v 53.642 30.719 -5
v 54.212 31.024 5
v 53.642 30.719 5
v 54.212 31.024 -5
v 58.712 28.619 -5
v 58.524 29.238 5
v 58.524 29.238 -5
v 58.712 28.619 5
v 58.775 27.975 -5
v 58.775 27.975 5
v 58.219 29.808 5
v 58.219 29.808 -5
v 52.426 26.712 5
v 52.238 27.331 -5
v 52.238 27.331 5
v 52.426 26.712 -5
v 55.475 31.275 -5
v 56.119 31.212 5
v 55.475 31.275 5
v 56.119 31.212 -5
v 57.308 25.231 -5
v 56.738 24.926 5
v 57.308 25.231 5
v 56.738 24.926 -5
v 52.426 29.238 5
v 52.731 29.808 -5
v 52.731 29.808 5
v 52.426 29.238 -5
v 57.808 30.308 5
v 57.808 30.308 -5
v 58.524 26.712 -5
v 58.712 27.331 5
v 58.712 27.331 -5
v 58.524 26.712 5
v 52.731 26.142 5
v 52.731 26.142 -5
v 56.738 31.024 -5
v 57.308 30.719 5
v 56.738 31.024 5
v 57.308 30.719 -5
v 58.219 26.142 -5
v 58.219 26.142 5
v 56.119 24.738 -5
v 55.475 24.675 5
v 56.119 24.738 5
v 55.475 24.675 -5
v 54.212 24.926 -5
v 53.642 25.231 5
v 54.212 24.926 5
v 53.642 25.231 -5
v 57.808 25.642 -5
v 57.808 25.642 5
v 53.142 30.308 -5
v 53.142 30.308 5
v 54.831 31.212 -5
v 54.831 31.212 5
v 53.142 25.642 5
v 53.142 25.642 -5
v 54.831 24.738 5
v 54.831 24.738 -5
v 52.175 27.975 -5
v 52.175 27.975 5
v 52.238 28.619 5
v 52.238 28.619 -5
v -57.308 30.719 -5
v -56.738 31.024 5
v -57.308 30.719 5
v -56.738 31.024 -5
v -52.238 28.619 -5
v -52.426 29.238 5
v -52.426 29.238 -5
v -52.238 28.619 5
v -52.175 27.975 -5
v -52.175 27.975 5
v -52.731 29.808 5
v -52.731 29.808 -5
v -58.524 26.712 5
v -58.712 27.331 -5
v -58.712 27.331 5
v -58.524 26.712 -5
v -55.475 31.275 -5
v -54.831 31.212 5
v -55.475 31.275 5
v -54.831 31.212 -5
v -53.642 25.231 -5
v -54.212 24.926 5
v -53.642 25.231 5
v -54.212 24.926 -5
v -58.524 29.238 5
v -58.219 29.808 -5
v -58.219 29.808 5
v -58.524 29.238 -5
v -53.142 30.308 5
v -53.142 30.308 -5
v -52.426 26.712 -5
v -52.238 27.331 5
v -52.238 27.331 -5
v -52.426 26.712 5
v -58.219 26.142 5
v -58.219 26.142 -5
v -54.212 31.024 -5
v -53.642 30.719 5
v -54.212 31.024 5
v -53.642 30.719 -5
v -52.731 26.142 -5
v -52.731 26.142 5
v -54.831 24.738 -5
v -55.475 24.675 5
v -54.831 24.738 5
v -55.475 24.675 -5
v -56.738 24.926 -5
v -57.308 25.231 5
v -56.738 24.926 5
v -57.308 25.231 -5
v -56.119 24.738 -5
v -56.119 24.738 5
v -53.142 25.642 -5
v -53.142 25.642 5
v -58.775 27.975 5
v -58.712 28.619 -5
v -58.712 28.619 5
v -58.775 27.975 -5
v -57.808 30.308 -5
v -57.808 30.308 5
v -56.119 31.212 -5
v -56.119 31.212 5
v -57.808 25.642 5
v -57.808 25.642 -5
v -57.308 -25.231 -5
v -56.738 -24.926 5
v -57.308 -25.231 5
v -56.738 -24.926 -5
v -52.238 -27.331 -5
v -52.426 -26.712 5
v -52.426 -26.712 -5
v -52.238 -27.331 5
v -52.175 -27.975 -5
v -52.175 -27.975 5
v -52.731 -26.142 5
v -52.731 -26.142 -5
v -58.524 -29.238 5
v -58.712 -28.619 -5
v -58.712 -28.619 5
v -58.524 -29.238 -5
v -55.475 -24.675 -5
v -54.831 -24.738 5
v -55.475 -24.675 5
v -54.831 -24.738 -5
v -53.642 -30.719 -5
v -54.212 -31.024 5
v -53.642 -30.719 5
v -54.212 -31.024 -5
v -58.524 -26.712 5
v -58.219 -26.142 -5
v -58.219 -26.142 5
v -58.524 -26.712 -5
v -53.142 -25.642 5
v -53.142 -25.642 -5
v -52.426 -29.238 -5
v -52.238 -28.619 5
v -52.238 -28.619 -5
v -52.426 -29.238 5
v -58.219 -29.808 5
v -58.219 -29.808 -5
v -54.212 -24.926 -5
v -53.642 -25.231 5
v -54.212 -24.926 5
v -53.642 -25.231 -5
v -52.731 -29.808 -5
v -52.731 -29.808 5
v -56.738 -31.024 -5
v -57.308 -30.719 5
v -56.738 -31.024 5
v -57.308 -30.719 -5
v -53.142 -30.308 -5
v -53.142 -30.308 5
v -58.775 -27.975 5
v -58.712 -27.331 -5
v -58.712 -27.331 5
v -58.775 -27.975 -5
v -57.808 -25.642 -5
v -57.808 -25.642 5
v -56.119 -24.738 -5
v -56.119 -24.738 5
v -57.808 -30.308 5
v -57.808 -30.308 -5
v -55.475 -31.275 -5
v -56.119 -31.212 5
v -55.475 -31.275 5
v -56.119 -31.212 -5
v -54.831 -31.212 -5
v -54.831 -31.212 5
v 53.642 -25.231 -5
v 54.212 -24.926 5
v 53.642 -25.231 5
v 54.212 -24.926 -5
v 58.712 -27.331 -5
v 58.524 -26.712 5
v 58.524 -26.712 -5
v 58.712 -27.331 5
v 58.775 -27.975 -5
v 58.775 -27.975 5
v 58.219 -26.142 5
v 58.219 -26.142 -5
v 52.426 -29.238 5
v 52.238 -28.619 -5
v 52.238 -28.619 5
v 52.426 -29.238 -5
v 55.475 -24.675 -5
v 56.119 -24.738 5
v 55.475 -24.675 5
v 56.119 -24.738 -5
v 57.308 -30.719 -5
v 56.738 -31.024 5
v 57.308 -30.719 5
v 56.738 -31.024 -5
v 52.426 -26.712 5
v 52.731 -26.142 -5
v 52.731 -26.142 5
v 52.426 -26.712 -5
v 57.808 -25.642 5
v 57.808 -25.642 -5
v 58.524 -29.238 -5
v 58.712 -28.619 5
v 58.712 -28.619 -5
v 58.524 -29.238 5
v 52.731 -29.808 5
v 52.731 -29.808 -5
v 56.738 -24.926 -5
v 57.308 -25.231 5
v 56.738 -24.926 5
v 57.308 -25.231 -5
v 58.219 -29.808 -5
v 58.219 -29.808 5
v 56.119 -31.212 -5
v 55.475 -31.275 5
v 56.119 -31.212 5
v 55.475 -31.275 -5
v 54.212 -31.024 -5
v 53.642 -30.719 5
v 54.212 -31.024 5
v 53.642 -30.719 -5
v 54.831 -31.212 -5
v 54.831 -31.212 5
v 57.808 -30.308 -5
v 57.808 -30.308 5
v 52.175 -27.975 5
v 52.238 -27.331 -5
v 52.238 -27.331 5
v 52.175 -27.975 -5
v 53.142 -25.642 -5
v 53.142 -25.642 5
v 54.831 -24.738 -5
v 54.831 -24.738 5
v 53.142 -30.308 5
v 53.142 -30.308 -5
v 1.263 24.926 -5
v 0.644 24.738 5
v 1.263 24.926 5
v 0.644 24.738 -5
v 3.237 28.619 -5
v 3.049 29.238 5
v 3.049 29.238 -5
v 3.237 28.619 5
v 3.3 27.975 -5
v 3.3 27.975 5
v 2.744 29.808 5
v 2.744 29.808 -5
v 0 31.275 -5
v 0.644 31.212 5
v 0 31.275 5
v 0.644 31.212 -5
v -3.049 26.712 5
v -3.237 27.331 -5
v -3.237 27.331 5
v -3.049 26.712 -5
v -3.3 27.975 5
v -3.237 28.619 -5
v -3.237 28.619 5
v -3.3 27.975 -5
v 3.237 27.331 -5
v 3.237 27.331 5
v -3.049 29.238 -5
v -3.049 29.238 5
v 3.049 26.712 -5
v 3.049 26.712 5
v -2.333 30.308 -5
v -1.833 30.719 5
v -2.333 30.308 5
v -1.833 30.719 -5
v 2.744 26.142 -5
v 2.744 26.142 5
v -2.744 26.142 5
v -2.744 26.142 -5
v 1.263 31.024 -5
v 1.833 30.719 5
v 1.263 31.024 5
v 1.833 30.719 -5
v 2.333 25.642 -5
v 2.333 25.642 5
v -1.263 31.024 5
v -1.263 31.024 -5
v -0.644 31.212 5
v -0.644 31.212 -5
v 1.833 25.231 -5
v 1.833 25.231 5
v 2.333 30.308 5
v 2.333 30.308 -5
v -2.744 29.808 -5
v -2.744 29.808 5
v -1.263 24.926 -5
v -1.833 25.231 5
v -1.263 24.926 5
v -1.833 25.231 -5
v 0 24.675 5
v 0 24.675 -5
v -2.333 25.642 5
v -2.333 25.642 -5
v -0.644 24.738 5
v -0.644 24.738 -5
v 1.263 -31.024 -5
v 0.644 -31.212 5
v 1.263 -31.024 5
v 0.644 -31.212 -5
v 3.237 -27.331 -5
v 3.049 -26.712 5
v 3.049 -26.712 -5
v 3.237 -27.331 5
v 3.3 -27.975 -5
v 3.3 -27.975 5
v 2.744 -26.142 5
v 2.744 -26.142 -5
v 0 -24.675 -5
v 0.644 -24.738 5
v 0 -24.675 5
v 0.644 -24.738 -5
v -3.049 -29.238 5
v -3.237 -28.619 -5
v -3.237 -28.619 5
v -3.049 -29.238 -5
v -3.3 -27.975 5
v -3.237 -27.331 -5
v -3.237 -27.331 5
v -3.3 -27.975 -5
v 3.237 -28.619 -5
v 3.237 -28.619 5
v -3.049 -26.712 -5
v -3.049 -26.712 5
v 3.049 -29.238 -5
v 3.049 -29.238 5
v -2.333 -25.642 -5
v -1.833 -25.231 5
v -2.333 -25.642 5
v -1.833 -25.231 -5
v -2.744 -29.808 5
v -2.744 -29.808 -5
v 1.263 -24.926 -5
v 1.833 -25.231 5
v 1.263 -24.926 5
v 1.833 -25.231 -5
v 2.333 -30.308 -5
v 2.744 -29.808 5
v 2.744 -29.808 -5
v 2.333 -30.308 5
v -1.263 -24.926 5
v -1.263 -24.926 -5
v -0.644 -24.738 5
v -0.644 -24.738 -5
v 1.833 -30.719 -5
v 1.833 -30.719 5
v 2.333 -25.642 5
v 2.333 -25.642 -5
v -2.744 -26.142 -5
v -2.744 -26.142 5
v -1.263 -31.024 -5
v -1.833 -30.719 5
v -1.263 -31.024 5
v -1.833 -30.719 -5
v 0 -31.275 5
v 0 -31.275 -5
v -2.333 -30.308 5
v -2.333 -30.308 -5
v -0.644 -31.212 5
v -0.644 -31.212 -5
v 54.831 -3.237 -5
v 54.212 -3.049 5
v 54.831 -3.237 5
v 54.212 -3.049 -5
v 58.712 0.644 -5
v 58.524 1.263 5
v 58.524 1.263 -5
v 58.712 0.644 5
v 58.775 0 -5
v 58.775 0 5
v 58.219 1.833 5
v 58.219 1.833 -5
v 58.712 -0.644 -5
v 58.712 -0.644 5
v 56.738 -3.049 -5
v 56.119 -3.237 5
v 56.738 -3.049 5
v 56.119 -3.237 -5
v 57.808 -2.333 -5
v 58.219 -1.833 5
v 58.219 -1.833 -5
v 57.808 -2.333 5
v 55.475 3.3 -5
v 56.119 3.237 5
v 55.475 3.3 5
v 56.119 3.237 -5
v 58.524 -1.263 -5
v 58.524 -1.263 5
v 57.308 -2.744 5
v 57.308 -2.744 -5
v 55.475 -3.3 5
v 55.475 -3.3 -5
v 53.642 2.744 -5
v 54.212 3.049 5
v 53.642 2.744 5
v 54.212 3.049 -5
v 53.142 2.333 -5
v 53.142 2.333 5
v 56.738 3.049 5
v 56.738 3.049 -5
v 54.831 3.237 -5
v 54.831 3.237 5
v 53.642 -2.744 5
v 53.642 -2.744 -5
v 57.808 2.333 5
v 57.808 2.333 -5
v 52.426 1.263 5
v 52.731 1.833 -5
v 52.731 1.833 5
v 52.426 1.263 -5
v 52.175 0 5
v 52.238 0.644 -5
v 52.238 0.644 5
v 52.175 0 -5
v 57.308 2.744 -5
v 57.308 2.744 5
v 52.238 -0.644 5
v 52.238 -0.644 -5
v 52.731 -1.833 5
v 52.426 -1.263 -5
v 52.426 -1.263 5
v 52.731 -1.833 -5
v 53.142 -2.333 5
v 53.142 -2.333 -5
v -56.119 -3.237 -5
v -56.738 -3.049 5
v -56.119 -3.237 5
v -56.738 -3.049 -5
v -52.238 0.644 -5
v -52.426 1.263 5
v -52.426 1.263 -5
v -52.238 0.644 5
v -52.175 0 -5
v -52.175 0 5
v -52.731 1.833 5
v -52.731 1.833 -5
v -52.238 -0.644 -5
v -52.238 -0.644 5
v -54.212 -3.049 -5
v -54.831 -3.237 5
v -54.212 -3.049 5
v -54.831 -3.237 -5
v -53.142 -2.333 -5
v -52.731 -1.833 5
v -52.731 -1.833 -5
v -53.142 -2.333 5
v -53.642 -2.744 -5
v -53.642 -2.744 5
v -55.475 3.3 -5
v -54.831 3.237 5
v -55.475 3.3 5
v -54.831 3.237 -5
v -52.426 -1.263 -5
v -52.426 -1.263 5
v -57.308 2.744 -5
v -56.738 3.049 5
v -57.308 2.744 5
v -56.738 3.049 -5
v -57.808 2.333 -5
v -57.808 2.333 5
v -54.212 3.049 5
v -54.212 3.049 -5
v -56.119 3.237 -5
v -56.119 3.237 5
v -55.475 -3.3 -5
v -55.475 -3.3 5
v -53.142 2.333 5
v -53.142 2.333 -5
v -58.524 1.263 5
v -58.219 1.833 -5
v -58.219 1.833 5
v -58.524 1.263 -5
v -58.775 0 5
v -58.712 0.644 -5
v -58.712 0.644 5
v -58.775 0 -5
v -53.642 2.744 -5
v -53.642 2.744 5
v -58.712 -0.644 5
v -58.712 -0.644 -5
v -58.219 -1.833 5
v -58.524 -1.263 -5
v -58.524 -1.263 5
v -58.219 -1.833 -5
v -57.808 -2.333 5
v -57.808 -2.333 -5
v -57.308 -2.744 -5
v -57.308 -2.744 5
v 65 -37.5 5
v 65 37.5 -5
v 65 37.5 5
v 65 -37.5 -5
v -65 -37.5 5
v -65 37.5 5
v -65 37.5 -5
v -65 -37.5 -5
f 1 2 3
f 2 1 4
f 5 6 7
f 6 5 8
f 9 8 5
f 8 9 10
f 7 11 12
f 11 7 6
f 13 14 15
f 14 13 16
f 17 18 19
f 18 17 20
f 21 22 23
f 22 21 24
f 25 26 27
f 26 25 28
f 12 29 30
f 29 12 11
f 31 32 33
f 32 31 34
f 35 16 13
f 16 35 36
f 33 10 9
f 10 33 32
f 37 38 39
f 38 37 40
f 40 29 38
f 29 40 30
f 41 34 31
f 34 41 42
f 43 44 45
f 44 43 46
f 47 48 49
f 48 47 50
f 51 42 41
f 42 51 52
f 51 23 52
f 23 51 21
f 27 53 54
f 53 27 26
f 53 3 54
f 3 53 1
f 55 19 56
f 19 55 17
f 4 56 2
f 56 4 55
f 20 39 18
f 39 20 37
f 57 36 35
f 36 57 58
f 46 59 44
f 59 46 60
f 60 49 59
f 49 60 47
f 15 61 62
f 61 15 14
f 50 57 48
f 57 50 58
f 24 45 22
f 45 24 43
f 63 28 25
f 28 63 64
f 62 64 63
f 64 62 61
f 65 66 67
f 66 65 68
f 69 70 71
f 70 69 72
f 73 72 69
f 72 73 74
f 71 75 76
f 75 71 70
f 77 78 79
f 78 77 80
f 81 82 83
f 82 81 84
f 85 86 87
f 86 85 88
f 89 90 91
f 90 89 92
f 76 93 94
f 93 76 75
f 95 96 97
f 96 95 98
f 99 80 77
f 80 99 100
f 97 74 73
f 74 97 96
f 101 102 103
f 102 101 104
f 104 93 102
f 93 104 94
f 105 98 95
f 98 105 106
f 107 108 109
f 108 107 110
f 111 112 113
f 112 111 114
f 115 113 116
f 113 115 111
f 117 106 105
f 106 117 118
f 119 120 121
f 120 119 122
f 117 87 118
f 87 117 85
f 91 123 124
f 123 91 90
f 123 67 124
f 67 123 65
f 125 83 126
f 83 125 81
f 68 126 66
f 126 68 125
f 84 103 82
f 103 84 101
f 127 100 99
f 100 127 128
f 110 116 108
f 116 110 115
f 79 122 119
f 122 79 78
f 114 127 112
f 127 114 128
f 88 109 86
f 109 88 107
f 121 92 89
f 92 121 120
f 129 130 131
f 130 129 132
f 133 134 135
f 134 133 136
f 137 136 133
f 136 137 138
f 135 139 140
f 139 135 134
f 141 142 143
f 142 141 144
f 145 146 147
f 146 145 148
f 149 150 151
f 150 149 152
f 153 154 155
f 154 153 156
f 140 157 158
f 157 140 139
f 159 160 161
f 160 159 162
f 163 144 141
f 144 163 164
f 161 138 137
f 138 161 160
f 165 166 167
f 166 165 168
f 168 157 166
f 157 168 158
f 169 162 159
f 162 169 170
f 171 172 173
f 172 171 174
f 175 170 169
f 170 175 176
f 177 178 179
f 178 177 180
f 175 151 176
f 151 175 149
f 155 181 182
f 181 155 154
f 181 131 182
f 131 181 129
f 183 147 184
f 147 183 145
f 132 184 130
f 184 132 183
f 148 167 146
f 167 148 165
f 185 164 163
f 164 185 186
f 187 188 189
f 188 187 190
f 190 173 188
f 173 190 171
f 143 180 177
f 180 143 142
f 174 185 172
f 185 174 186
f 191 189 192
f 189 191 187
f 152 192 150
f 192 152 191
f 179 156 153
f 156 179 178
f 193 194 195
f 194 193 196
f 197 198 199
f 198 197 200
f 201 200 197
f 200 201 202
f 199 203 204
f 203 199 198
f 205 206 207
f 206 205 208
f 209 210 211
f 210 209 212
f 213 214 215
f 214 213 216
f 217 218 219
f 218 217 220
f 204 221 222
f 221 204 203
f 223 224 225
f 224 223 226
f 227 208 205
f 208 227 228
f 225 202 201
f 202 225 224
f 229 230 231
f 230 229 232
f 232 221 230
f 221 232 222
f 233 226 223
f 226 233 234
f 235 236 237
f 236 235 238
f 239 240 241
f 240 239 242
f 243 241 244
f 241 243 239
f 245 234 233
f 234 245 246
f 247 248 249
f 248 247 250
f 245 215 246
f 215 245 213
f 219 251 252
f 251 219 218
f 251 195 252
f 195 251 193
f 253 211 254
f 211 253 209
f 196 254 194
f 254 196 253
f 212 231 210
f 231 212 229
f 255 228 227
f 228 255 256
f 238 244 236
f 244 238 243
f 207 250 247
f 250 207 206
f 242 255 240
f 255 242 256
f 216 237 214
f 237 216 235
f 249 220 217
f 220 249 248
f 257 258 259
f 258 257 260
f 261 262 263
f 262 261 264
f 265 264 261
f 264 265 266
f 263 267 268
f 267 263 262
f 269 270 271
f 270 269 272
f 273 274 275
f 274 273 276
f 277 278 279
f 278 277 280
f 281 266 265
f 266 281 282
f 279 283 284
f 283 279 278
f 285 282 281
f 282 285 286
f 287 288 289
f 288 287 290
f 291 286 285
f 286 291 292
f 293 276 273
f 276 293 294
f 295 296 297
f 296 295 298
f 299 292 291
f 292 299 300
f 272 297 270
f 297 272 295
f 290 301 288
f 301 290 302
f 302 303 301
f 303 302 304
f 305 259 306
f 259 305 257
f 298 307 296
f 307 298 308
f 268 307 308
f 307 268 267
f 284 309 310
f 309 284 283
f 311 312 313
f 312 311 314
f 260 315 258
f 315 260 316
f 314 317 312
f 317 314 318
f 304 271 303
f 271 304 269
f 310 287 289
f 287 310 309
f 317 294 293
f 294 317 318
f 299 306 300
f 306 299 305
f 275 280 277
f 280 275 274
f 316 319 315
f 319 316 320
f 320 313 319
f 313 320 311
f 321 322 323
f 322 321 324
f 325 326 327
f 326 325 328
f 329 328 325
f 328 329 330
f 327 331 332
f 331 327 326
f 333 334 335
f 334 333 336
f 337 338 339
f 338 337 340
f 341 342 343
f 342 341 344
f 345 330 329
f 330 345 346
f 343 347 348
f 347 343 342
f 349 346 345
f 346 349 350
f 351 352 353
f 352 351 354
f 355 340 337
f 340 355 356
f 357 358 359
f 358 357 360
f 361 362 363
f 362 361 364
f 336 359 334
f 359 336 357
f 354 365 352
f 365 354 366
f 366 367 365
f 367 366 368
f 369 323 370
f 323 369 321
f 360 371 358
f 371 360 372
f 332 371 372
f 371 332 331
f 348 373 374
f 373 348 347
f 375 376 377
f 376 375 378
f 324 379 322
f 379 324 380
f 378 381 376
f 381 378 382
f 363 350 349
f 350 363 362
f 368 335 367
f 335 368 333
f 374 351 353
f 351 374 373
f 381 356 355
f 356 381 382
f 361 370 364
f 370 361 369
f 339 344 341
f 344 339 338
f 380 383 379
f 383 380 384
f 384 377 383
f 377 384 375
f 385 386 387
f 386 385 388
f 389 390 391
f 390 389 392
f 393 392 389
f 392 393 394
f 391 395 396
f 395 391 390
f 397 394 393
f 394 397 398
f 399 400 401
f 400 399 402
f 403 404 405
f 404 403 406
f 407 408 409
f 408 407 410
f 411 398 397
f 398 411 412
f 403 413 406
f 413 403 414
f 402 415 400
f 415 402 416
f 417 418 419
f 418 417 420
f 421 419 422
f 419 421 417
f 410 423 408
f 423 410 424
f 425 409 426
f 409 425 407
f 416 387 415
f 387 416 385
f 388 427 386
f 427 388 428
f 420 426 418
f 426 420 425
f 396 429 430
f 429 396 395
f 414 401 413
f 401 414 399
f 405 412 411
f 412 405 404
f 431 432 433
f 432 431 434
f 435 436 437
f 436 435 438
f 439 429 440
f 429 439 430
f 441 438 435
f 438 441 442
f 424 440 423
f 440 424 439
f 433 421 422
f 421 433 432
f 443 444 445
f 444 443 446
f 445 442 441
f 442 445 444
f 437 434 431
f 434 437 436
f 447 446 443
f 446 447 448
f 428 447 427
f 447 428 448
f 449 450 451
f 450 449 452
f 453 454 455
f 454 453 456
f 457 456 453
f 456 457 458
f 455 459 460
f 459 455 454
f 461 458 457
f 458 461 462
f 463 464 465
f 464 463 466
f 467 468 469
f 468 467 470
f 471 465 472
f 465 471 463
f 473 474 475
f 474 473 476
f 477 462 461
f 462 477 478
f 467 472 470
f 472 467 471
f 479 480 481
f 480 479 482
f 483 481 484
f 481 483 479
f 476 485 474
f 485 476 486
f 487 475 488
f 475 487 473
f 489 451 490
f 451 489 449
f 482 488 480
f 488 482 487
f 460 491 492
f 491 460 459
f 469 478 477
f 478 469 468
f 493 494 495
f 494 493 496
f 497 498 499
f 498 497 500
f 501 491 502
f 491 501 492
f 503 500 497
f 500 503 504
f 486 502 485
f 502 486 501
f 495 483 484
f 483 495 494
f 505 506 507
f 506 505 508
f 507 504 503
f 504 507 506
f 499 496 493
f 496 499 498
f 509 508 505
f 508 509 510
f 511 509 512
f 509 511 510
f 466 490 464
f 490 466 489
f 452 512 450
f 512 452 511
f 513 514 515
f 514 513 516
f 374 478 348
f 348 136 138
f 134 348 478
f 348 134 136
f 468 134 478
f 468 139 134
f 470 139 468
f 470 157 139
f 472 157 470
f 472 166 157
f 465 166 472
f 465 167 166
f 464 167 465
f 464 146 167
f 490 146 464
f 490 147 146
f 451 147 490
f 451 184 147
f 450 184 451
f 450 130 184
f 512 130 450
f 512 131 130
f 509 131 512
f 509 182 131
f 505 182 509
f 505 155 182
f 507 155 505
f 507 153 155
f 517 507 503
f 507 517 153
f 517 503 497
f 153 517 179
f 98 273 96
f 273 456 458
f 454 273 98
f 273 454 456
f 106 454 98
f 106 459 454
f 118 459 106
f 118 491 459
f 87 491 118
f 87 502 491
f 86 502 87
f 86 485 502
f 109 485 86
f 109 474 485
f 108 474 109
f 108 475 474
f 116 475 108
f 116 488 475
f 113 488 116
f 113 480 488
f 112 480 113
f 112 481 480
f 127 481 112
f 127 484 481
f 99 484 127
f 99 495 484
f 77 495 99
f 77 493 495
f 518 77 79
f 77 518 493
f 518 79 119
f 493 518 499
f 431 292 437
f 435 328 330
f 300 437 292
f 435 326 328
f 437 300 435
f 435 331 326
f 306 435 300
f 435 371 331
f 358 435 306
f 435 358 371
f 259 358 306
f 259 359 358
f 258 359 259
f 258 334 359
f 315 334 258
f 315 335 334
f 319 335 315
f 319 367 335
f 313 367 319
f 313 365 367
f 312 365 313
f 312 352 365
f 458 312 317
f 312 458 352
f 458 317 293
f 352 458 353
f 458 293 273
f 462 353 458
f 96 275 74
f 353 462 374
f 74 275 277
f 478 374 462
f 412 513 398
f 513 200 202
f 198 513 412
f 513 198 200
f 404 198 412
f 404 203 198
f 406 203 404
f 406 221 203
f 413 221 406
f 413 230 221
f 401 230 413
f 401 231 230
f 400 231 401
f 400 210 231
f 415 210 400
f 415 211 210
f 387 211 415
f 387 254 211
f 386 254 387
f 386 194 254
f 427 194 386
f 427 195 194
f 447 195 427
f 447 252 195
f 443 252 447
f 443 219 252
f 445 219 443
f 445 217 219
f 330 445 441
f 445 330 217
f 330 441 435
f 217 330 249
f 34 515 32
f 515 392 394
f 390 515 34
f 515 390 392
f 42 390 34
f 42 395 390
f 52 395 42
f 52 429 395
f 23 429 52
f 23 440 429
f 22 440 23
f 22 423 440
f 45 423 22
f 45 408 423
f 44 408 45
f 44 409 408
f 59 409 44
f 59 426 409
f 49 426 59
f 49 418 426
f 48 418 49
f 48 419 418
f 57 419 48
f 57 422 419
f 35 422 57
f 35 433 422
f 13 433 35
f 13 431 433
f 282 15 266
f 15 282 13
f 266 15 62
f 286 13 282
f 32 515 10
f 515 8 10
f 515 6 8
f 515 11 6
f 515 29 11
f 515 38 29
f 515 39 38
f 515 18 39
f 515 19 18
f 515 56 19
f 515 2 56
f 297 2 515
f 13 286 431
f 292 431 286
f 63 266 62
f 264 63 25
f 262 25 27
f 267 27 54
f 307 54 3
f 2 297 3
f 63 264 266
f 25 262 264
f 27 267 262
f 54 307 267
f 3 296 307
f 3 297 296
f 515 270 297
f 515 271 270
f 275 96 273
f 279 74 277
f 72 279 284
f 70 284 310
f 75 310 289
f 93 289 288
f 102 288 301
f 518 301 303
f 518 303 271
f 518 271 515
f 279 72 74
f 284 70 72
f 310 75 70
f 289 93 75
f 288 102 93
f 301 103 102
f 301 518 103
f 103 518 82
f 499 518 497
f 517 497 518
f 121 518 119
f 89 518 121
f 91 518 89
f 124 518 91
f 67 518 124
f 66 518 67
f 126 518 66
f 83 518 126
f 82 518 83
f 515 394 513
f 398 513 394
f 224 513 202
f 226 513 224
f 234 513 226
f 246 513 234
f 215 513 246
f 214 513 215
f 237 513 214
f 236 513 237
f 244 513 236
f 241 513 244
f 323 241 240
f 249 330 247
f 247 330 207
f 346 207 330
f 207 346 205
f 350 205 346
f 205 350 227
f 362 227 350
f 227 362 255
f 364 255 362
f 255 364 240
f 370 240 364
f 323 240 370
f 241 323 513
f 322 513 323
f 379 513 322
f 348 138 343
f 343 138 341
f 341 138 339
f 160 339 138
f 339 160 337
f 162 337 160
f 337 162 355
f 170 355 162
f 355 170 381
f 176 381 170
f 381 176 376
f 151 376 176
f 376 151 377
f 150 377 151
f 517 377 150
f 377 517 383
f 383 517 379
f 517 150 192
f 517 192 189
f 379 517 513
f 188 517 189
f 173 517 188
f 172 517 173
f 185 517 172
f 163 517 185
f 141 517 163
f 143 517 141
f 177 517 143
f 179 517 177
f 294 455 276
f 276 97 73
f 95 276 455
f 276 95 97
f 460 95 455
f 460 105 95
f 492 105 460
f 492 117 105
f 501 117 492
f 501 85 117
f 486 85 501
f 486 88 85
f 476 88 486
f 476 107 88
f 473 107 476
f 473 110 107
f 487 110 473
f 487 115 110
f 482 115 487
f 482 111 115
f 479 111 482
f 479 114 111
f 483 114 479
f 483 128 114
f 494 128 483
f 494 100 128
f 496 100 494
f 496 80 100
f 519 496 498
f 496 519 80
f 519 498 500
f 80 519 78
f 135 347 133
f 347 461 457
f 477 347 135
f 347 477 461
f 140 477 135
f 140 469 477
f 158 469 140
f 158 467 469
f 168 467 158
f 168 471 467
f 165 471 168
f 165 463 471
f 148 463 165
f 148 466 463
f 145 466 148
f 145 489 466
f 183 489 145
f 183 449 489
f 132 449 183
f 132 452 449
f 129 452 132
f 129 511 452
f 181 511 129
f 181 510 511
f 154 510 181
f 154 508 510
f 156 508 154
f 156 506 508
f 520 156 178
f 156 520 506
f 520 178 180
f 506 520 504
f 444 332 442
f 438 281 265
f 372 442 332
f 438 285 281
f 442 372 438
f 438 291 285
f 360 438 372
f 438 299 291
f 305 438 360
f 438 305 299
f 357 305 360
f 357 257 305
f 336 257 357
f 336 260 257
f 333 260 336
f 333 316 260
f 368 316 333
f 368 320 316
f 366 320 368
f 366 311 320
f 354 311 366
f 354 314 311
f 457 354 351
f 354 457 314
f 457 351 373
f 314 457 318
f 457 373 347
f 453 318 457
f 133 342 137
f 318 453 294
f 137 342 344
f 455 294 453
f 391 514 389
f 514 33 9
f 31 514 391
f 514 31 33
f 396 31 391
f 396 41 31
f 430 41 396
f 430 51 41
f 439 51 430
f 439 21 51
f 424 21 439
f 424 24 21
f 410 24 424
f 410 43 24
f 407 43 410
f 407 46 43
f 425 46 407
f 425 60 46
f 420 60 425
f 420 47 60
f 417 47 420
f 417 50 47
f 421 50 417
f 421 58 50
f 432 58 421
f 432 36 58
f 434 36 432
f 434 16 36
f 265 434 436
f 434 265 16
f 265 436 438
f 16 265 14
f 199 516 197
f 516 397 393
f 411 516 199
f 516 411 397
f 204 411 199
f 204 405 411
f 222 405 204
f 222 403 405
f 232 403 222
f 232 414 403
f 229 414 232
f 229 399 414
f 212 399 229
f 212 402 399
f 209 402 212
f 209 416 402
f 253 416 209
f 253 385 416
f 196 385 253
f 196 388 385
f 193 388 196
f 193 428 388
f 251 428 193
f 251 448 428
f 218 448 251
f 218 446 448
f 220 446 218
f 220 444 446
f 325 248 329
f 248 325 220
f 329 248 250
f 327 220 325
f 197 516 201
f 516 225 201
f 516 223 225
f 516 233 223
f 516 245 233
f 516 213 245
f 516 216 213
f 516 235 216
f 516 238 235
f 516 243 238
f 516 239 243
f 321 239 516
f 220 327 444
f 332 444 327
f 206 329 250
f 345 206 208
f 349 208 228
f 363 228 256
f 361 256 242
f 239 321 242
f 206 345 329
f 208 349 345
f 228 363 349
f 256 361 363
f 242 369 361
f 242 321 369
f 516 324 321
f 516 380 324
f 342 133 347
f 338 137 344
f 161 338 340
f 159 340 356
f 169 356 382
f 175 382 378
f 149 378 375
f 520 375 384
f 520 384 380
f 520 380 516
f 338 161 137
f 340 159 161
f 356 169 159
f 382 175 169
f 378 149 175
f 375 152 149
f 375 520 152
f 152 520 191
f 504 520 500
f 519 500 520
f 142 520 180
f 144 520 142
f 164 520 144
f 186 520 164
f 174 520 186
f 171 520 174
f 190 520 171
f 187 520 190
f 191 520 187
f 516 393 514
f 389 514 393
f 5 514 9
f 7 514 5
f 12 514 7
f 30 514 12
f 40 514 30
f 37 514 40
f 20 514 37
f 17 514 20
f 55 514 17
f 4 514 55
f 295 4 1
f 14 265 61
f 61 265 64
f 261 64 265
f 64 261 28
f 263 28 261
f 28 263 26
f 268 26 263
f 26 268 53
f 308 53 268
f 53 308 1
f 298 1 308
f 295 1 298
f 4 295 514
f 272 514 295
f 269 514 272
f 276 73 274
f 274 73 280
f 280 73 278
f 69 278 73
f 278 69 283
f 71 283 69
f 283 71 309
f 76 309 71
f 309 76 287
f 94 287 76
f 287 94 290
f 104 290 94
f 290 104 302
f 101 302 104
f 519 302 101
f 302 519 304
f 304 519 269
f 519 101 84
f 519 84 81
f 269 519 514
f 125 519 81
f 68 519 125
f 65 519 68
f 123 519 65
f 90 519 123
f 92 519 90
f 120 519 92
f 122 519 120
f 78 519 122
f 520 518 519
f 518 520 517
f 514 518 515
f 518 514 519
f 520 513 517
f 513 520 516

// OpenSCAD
$fn = 32;

// ----------------------------------------------------------------------
// Corner plate 130 x 75 x 10
// 8 holes, centres taken from the edge offset
// ----------------------------------------------------------------------

// --- parameters (mm) ---
plate = [130, 75, 10];  // overall size (x, y, z)
holes = 8;              // number of holes the drawing asks for
hole_d = 6.6;           // hole diameter
edge = 9.525;           // hole centre offset from the plate edge

// --- derived feature positions (mm) ---
corner_x = plate[0] / 2 - edge;  // = 55.48   corner hole X
corner_y = plate[1] / 2 - edge;  // = 27.98   corner hole Y
feature_centers = [
  [corner_x, corner_y],
  [-corner_x, corner_y],
  [-corner_x, -corner_y],
  [corner_x, -corner_y],
  [0, corner_y],
  [0, -corner_y],
  [corner_x, 0],
  [-corner_x, 0]
];   // hole centres the loop below drills

// plate outline, every hole drilled through with the same cutters
difference() {
  cube(plate, center = true);
  for (centre = feature_centers)
    translate([centre[0], centre[1], 0])
      cylinder(d = hole_d, h = plate[2] + 2, center = true);
}
